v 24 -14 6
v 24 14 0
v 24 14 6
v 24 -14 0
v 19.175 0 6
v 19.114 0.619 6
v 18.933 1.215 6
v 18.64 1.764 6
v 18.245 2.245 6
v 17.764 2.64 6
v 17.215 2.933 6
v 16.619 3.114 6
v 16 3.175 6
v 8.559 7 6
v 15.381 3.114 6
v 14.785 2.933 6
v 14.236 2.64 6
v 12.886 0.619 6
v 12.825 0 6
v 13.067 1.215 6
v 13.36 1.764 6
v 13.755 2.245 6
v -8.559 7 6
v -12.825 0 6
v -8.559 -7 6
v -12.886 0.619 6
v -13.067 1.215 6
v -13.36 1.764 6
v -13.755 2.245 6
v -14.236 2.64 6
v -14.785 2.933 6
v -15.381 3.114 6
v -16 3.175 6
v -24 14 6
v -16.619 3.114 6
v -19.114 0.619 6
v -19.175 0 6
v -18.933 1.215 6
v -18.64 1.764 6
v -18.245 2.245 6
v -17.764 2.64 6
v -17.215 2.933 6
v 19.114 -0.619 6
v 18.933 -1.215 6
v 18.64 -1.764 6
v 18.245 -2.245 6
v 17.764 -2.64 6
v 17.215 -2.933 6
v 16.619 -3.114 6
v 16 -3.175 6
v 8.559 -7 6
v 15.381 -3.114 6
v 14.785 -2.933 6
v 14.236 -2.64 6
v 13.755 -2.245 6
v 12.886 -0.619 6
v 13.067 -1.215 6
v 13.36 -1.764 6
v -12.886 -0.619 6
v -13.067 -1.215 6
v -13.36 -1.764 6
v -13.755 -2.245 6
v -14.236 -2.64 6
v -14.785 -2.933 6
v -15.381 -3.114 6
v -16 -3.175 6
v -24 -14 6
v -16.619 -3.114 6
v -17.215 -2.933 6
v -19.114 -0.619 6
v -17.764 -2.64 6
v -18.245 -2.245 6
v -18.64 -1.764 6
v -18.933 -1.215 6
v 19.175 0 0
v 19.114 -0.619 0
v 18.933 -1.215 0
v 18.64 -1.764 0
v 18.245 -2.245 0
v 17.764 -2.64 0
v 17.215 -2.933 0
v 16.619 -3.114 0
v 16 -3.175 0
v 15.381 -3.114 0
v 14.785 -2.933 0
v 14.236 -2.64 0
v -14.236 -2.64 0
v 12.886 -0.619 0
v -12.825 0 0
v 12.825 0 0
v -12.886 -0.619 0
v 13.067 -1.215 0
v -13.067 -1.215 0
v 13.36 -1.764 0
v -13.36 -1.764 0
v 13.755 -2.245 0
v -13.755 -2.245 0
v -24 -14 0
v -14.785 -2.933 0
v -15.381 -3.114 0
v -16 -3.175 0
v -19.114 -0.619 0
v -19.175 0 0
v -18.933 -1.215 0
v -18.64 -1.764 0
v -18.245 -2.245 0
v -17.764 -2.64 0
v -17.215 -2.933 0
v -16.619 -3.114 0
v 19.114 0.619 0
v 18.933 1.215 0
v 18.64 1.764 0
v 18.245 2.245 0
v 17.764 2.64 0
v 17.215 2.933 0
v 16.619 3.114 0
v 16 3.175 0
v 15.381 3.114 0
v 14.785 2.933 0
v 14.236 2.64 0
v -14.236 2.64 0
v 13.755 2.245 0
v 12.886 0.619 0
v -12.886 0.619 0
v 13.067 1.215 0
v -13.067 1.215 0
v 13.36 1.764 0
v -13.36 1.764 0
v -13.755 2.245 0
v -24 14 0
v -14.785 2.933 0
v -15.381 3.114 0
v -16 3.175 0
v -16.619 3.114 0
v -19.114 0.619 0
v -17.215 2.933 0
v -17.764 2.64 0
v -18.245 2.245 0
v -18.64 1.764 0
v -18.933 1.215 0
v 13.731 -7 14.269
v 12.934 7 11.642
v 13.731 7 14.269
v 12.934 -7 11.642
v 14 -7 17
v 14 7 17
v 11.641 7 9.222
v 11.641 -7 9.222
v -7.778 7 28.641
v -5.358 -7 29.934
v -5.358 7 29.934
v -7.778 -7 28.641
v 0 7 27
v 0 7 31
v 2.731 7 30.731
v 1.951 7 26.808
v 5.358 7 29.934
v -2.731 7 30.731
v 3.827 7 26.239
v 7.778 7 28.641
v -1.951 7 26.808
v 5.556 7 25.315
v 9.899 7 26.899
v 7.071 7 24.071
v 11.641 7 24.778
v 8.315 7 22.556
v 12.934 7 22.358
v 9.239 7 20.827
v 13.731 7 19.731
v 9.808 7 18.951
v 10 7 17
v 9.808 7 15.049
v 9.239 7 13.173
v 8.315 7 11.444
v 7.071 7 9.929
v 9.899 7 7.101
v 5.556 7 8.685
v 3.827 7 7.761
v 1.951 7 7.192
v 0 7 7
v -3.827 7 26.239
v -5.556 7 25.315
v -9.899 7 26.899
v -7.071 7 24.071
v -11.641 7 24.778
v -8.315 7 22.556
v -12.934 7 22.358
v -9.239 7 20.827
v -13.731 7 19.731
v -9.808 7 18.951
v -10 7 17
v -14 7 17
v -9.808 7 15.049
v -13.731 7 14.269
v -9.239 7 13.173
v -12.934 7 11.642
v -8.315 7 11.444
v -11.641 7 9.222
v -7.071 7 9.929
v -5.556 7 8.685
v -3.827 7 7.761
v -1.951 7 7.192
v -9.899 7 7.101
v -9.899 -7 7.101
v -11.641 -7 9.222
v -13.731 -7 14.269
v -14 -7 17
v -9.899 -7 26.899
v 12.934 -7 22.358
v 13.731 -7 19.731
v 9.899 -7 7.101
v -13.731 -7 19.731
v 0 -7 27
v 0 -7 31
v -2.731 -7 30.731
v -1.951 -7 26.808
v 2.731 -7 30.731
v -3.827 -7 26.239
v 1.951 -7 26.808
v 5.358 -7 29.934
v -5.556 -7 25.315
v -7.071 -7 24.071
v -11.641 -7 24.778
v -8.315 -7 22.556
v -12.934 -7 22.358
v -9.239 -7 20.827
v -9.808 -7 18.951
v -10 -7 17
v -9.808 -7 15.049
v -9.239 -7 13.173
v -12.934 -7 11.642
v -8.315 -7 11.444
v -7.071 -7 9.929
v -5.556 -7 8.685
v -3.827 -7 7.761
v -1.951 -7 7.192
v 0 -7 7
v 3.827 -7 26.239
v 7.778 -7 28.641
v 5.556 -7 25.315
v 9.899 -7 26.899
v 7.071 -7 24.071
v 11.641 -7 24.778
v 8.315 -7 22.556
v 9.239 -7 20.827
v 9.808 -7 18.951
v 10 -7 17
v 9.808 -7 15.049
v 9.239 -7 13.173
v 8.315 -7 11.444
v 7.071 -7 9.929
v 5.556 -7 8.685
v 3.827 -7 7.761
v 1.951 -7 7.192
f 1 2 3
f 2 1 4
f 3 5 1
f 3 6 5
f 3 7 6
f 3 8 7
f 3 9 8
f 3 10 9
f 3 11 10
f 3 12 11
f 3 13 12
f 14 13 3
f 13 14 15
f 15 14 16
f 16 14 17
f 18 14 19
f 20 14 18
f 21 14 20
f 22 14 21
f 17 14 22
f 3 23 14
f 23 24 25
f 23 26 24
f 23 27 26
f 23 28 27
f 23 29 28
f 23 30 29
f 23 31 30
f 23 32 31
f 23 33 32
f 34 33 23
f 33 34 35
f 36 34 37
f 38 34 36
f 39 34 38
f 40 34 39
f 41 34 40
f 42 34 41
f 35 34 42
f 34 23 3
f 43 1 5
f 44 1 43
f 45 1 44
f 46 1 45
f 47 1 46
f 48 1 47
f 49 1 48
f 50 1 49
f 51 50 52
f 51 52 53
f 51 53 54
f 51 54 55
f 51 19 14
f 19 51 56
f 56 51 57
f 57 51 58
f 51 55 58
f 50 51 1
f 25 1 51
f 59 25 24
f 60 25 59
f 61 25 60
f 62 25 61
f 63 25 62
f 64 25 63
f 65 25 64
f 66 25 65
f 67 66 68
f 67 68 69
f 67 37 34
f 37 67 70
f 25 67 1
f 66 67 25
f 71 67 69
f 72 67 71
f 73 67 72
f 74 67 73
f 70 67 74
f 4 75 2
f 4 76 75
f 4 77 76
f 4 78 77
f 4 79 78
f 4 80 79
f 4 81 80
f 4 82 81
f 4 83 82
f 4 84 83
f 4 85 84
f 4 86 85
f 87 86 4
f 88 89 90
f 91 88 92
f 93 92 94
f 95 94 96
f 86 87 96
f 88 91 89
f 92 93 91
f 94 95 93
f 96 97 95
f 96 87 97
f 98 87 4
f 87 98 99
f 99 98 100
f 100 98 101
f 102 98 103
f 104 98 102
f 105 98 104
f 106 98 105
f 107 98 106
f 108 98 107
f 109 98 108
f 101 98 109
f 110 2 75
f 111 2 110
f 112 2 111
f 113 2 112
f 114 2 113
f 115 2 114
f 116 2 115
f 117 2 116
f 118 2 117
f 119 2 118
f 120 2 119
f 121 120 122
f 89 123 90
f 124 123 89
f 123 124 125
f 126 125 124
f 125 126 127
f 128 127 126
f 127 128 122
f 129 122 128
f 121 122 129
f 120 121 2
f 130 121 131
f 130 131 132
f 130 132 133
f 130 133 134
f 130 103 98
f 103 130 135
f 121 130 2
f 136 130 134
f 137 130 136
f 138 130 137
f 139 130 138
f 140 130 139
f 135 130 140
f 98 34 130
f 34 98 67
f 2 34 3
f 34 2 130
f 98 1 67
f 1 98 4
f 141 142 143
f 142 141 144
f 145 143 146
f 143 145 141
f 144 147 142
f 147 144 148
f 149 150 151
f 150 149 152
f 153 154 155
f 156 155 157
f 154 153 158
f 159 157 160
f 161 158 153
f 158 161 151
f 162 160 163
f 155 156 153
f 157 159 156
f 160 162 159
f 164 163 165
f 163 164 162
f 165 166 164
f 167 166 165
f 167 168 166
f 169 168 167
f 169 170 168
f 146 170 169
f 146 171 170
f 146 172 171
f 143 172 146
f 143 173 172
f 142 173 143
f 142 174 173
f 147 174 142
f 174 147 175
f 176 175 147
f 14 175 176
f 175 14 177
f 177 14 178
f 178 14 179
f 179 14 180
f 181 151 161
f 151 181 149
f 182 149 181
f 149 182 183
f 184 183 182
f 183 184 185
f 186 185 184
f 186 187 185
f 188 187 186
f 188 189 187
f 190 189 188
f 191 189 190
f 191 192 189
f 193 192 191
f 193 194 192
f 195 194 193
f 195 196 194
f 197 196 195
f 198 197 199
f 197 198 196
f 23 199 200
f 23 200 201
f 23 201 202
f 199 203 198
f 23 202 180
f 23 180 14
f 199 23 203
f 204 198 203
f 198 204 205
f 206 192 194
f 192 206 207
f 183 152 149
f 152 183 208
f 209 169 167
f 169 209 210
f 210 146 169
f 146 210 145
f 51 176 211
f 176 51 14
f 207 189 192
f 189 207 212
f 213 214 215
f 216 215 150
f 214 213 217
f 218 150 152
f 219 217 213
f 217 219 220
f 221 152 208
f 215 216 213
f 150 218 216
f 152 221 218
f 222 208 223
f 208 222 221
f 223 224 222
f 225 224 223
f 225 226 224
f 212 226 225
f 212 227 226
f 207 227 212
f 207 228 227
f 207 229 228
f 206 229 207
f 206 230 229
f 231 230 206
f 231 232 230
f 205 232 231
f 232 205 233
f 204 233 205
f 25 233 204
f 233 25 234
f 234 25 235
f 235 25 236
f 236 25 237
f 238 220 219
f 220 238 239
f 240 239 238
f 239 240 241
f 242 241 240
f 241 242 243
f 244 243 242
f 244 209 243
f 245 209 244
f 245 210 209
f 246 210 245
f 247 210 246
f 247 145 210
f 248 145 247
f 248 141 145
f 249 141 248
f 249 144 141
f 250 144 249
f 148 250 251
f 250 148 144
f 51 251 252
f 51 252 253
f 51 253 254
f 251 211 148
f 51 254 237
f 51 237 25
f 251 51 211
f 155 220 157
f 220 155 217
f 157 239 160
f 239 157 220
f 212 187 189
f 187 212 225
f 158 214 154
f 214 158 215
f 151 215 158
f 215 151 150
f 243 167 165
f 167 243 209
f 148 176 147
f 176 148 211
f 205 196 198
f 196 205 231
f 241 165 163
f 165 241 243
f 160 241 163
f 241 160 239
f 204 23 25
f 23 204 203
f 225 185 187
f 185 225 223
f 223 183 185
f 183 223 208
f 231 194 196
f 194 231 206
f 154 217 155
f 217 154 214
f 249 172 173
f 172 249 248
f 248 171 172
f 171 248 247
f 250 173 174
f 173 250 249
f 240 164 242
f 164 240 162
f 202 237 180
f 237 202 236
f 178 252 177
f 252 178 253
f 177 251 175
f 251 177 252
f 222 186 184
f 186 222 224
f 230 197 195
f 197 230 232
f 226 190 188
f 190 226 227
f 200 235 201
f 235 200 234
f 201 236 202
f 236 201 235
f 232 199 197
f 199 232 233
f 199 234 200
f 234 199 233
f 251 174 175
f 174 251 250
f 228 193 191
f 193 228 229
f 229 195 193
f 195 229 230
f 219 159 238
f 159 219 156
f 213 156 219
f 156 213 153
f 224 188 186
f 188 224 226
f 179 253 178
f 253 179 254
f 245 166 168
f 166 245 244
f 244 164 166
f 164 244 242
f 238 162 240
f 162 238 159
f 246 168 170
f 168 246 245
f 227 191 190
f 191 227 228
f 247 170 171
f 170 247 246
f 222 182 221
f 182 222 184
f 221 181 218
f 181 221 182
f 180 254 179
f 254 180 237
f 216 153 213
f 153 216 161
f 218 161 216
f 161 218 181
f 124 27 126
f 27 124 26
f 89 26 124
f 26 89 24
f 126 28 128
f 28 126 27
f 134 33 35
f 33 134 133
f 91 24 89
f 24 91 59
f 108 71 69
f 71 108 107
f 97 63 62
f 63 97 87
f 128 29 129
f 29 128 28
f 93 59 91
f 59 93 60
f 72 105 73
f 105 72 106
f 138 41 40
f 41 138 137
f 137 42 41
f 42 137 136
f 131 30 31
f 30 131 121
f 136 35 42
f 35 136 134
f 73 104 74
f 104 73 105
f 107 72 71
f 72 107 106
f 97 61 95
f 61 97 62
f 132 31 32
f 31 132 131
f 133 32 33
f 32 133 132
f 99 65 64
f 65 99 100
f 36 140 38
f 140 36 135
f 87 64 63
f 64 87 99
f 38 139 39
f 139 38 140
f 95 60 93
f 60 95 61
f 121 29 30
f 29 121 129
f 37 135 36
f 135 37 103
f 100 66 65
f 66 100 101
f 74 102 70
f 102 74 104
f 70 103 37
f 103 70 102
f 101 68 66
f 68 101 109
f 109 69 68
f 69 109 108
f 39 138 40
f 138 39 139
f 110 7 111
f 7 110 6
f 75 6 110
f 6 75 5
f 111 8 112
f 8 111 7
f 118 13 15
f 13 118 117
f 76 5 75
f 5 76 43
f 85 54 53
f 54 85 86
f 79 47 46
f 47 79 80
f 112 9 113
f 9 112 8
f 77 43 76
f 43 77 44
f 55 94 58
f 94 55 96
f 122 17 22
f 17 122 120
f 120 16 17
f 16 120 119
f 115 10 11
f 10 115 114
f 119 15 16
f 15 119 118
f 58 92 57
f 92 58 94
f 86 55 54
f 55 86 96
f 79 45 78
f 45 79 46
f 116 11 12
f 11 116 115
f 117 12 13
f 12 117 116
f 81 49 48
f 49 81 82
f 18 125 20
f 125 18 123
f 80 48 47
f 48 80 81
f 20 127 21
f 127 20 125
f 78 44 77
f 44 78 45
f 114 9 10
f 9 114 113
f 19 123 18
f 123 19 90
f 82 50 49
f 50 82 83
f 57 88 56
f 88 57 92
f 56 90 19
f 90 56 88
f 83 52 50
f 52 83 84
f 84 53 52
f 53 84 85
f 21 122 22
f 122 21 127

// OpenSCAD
$fn = 32;

// ----------------------------------------------------------------------
// Deck eye: 28 mm eye on a 48 mm base
// ----------------------------------------------------------------------

// --- parameters (mm) ---
base_l = 48;              // base length
base_w = 28;              // base width
base_t = 6;               // base thickness
eye_r = 14;               // eye outside radius
eye_bore = 20;            // eye bore diameter
eye_w = 14;               // eye thickness
eye_z = 17;               // eye centre height
holes_d = 6.35;           // fixing holes
hole_x = 16;              // fixing hole spacing

difference() {
  union() {
    translate([-24, -14, 0]) cube([base_l, base_w, base_t]);
    /* eye standing upright, its foot sunk 3 mm into the base */
    translate([0, -7, 17]) rotate([-90, 0, 0]) cylinder(h = 14, d = 28);
  }
  /* eye bore, 2.5 mm clear of both faces */
  translate([0, -9.5, 17]) rotate([-90, 0, 0]) cylinder(h = 19, d = 20);
  translate([-16, 0, -2.5]) cylinder(h = base_t + 5, d = holes_d);
  translate([16, 0, -2.5]) cylinder(h = base_t + 5, d = holes_d);
}
